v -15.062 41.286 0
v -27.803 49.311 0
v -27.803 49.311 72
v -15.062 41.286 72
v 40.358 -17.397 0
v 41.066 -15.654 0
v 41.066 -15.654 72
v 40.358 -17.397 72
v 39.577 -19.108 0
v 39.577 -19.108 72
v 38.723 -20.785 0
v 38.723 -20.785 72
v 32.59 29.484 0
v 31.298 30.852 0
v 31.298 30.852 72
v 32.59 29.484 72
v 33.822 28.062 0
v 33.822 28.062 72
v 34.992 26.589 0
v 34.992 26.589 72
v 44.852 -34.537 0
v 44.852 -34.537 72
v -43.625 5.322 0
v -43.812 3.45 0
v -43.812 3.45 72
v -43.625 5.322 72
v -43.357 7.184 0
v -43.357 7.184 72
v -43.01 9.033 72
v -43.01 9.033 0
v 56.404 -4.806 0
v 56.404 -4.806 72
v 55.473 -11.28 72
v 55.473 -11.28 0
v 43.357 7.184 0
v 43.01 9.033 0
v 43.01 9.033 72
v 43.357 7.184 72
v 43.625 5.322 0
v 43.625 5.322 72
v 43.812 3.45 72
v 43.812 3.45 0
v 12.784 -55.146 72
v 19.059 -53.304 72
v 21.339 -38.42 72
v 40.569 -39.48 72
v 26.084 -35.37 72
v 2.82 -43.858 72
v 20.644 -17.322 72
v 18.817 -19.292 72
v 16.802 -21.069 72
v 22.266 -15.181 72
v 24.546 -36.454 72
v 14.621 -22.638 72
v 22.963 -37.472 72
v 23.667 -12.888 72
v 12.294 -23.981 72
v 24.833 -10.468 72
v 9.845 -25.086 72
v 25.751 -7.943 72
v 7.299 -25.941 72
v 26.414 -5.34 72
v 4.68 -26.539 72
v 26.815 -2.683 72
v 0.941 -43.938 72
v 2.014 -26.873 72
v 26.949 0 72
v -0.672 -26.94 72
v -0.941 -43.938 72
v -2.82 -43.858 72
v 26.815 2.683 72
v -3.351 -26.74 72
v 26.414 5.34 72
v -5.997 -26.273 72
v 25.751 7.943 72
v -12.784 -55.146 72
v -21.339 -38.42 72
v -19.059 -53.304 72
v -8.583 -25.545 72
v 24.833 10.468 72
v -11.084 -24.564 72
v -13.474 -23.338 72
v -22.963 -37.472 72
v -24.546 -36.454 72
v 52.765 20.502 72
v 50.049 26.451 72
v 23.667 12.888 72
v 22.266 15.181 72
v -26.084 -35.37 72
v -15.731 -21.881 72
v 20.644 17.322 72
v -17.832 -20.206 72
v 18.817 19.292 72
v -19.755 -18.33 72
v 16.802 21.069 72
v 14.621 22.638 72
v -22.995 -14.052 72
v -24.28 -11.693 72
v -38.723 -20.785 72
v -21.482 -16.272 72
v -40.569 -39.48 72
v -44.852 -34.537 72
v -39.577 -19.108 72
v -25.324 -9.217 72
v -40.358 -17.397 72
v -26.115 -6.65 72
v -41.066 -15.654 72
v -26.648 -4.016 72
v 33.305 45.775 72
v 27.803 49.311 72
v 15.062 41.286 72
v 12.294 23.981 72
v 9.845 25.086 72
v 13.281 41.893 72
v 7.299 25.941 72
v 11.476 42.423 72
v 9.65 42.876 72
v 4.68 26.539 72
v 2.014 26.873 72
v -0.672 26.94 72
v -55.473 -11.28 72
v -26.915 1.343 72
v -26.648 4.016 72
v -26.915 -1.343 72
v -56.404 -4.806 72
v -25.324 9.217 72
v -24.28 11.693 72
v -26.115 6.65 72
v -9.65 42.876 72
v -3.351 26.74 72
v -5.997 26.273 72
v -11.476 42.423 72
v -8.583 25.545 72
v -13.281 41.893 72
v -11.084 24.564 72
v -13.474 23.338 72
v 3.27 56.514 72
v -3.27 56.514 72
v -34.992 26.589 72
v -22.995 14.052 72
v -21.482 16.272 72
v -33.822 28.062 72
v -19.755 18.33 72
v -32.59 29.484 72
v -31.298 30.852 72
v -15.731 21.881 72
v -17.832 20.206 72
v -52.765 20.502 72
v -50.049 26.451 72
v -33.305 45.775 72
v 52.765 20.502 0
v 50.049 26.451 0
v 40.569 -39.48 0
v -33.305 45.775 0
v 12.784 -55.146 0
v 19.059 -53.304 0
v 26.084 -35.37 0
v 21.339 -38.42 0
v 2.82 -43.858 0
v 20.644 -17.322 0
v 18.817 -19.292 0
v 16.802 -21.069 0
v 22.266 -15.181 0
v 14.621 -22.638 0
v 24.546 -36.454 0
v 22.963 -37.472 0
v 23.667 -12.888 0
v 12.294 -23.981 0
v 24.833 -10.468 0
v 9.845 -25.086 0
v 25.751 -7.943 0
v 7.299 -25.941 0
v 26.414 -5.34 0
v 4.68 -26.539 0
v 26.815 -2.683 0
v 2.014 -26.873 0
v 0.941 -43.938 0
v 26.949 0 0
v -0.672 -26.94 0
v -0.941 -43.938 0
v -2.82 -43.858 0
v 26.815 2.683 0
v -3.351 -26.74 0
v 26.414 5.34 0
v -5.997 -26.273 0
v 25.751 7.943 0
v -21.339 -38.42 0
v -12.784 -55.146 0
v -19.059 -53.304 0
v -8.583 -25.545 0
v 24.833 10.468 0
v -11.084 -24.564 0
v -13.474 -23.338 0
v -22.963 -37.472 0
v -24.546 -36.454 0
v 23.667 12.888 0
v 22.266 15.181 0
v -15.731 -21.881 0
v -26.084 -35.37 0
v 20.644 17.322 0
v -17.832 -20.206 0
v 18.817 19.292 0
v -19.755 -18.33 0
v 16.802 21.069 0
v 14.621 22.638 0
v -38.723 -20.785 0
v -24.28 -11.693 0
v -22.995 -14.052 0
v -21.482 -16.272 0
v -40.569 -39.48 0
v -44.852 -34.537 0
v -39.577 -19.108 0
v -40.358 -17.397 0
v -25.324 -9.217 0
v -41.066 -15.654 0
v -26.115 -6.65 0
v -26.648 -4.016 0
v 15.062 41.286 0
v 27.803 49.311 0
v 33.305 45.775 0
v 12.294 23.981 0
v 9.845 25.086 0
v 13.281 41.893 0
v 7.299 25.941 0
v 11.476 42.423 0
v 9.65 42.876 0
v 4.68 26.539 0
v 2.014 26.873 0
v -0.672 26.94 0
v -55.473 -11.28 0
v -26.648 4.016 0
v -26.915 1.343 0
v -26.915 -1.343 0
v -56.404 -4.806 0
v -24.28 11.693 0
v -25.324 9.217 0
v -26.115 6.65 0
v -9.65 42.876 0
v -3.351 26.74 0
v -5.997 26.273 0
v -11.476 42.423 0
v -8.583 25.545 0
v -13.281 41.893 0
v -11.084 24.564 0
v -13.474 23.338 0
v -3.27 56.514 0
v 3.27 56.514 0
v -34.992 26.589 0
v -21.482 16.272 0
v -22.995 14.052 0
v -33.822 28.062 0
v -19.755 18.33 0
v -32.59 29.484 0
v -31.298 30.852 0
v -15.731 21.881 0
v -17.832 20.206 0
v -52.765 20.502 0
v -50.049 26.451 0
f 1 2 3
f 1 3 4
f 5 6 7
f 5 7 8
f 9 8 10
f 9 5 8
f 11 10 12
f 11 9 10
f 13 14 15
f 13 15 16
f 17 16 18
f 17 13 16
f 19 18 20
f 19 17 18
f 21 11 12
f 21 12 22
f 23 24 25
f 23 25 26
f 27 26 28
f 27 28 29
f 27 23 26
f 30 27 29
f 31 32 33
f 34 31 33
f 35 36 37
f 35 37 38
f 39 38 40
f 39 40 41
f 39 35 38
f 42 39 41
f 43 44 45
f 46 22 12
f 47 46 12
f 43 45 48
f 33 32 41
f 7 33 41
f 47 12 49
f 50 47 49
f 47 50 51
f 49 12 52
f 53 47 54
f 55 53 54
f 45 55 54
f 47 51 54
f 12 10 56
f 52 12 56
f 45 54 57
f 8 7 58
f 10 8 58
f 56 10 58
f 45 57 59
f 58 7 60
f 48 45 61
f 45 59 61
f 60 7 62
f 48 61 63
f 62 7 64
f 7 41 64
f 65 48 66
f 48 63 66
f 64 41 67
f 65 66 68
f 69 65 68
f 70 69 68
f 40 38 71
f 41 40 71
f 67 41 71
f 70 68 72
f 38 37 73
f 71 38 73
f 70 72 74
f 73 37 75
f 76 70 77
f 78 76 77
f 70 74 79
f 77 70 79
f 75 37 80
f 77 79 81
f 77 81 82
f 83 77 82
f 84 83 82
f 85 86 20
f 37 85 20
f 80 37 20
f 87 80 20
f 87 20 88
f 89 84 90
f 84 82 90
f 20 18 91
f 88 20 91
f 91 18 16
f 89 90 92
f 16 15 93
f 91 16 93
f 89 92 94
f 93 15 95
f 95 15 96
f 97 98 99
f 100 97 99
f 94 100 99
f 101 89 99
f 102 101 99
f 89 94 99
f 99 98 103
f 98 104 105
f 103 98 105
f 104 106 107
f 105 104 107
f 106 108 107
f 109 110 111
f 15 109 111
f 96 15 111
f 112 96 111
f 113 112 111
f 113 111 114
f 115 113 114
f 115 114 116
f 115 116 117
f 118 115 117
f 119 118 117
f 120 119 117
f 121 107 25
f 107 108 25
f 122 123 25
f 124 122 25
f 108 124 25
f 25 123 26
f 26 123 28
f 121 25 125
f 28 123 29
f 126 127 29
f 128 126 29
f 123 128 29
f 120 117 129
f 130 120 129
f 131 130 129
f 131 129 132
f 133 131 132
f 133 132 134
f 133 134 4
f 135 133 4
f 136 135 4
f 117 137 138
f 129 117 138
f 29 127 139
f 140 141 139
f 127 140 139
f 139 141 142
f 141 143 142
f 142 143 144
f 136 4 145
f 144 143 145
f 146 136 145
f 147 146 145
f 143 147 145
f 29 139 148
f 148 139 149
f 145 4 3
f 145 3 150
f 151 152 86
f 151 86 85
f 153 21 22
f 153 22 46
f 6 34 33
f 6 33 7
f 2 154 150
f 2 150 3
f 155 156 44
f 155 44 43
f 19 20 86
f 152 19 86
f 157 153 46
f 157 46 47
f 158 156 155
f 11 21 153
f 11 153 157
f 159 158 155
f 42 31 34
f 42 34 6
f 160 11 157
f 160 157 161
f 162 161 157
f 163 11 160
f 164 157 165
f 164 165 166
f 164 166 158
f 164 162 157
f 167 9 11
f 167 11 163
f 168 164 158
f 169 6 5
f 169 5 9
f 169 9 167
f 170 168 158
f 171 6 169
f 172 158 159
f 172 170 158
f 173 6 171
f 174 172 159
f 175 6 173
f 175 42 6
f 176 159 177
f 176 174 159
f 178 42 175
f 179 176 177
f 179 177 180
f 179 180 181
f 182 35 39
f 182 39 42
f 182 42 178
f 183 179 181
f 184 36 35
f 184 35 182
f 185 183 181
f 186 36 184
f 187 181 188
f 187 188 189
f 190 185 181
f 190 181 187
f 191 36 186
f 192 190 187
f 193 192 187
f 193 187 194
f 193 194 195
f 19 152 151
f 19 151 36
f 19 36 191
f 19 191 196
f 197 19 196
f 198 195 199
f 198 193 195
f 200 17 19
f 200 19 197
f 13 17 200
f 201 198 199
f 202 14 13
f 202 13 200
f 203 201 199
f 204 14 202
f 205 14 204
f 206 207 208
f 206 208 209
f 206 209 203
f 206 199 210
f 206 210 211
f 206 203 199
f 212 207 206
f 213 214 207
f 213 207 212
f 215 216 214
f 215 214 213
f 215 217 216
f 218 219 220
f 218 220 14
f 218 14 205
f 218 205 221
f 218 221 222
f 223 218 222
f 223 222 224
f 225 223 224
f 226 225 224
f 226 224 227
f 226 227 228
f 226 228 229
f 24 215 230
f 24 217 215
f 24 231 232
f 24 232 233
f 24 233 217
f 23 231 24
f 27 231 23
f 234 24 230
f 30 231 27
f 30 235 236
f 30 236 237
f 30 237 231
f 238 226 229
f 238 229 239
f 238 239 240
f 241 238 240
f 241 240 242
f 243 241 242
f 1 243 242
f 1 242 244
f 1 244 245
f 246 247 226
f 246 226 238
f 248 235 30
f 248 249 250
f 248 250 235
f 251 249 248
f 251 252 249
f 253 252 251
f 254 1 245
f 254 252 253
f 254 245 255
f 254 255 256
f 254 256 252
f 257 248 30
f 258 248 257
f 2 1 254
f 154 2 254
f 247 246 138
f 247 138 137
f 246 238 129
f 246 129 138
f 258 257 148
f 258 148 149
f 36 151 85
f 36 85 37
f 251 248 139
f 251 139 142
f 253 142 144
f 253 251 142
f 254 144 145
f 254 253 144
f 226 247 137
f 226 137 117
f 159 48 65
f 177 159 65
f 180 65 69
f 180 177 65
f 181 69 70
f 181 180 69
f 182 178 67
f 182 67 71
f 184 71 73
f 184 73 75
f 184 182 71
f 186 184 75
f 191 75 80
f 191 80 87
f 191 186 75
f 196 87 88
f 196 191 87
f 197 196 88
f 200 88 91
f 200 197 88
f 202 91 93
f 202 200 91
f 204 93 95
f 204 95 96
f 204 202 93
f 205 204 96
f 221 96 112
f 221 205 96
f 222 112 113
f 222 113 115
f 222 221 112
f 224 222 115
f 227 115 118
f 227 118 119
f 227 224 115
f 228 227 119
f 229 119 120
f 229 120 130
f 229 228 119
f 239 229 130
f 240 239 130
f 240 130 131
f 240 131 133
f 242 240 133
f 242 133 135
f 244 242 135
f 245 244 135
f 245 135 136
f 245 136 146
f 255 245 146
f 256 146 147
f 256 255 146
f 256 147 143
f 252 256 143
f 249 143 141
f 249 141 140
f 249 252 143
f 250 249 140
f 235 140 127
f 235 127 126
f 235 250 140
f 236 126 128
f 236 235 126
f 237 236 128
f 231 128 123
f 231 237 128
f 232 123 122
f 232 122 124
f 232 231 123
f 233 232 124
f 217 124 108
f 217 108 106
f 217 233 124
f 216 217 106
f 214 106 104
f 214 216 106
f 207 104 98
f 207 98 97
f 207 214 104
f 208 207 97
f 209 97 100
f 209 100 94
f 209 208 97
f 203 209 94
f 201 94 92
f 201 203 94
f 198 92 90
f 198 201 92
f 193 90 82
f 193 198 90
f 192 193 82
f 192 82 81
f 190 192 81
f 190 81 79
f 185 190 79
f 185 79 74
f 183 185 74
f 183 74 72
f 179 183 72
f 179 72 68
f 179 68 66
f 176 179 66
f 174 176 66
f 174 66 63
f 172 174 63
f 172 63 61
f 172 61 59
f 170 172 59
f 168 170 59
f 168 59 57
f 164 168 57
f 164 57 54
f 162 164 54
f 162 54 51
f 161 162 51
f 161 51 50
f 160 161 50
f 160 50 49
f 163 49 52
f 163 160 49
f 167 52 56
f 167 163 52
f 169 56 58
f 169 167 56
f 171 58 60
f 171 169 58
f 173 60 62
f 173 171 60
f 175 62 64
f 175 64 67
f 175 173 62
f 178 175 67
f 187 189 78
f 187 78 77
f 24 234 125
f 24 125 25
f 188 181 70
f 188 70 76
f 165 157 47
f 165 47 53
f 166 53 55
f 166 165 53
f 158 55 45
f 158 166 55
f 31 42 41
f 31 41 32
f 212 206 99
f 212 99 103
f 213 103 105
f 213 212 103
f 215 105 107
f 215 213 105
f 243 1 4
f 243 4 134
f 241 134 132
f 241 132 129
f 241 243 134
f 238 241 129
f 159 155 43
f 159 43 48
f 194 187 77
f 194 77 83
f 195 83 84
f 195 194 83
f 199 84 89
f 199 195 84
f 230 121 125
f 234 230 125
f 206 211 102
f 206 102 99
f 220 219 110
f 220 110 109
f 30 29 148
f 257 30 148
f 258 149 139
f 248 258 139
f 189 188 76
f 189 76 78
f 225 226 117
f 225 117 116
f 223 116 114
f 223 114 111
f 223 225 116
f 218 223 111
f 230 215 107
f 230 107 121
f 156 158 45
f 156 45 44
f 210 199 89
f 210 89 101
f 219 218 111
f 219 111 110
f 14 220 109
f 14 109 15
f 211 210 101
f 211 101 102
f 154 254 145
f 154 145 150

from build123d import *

# Parameters (mm, degrees)
SKETCH1_R           = 26.948722821
BOSS_EXTRUDE2_DEPTH = 72


with BuildPart() as part:
    # Sketch1 → Boss-Extrude2 (new body)
    with BuildSketch(Plane.XY):
        with BuildLine():
            Line((-9.649968123, 42.875568313), (-3.270074231, 56.514068549))
            Line((-3.270074231, 56.514068549), (3.270074231, 56.514068549))
            Line((3.270074231, 56.514068549), (9.649968123, 42.875568313))
            ThreePointArc((9.649968123, 42.875568313), (12.381612983, 42.167901333), (15.062212526, 41.28638997))
            Line((15.062212526, 41.28638997), (27.802850719, 49.310595427))
            Line((27.802850719, 49.310595427), (33.304773717, 45.774724216))
            Line((33.304773717, 45.774724216), (31.298352077, 30.852056661))
            ThreePointArc((31.298352077, 30.852056661), (33.213764311, 28.779890604), (34.992247123, 26.589074527))
            Line((34.992247123, 26.589074527), (50.048567011, 26.451356669))
            Line((50.048567011, 26.451356669), (52.765442869, 20.502228373))
            Line((52.765442869, 20.502228373), (43.00973039, 9.033235009))
            ThreePointArc((43.00973039, 9.033235009), (43.500780148, 6.254467957), (43.812490502, 3.449915791))
            Line((43.812490502, 3.449915791), (56.404216903, -4.806000935))
            Line((56.404216903, -4.806000935), (55.473456732, -11.279580116))
            Line((55.473456732, -11.279580116), (41.065823196, -15.653574932))
            ThreePointArc((41.065823196, -15.653574932), (39.97660565, -18.256704074), (38.72257771, -20.784566832))
            Line((38.72257771, -20.784566832), (44.851926462, -34.5374872))
            Line((44.851926462, -34.5374872), (40.56904004, -39.480201616))
            Line((40.56904004, -39.480201616), (26.083807295, -35.370485435))
            ThreePointArc((26.083807295, -35.370485435), (23.760141319, -36.971501558), (21.338520096, -38.420096343))
            Line((21.338520096, -38.420096343), (19.059466278, -53.303565309))
            Line((19.059466278, -53.303565309), (12.784239782, -55.146138057))
            Line((12.784239782, -55.146138057), (2.820366877, -43.857516729))
            ThreePointArc((2.820366877, -43.857516729), (0, -43.948108525), (-2.820366877, -43.857516729))
            Line((-2.820366877, -43.857516729), (-12.784239782, -55.146138057))
            Line((-12.784239782, -55.146138057), (-19.059466278, -53.303565309))
            Line((-19.059466278, -53.303565309), (-21.338520096, -38.420096343))
            ThreePointArc((-21.338520096, -38.420096343), (-23.760141319, -36.971501558), (-26.083807295, -35.370485435))
            Line((-26.083807295, -35.370485435), (-40.56904004, -39.480201616))
            Line((-40.56904004, -39.480201616), (-44.851926462, -34.5374872))
            Line((-44.851926462, -34.5374872), (-38.72257771, -20.784566832))
            ThreePointArc((-38.72257771, -20.784566832), (-39.97660565, -18.256704074), (-41.065823196, -15.653574932))
            Line((-41.065823196, -15.653574932), (-55.473456732, -11.279580116))
            Line((-55.473456732, -11.279580116), (-56.404216903, -4.806000935))
            Line((-56.404216903, -4.806000935), (-43.812490502, 3.449915791))
            ThreePointArc((-43.812490502, 3.449915791), (-43.500780148, 6.254467957), (-43.00973039, 9.033235009))
            Line((-43.00973039, 9.033235009), (-52.765442869, 20.502228373))
            Line((-52.765442869, 20.502228373), (-50.048567011, 26.451356669))
            Line((-50.048567011, 26.451356669), (-34.992247123, 26.589074527))
            ThreePointArc((-34.992247123, 26.589074527), (-33.213764311, 28.779890604), (-31.298352077, 30.852056661))
            Line((-31.298352077, 30.852056661), (-33.304773718, 45.774724216))
            Line((-33.304773718, 45.774724216), (-27.802850719, 49.310595427))
            Line((-27.802850719, 49.310595427), (-15.062212526, 41.28638997))
            ThreePointArc((-15.062212526, 41.28638997), (-12.381612983, 42.167901333), (-9.649968123, 42.875568313))
        make_face()
        Circle(SKETCH1_R, mode=Mode.SUBTRACT)
    extrude(amount=BOSS_EXTRUDE2_DEPTH)


solid = part.part
